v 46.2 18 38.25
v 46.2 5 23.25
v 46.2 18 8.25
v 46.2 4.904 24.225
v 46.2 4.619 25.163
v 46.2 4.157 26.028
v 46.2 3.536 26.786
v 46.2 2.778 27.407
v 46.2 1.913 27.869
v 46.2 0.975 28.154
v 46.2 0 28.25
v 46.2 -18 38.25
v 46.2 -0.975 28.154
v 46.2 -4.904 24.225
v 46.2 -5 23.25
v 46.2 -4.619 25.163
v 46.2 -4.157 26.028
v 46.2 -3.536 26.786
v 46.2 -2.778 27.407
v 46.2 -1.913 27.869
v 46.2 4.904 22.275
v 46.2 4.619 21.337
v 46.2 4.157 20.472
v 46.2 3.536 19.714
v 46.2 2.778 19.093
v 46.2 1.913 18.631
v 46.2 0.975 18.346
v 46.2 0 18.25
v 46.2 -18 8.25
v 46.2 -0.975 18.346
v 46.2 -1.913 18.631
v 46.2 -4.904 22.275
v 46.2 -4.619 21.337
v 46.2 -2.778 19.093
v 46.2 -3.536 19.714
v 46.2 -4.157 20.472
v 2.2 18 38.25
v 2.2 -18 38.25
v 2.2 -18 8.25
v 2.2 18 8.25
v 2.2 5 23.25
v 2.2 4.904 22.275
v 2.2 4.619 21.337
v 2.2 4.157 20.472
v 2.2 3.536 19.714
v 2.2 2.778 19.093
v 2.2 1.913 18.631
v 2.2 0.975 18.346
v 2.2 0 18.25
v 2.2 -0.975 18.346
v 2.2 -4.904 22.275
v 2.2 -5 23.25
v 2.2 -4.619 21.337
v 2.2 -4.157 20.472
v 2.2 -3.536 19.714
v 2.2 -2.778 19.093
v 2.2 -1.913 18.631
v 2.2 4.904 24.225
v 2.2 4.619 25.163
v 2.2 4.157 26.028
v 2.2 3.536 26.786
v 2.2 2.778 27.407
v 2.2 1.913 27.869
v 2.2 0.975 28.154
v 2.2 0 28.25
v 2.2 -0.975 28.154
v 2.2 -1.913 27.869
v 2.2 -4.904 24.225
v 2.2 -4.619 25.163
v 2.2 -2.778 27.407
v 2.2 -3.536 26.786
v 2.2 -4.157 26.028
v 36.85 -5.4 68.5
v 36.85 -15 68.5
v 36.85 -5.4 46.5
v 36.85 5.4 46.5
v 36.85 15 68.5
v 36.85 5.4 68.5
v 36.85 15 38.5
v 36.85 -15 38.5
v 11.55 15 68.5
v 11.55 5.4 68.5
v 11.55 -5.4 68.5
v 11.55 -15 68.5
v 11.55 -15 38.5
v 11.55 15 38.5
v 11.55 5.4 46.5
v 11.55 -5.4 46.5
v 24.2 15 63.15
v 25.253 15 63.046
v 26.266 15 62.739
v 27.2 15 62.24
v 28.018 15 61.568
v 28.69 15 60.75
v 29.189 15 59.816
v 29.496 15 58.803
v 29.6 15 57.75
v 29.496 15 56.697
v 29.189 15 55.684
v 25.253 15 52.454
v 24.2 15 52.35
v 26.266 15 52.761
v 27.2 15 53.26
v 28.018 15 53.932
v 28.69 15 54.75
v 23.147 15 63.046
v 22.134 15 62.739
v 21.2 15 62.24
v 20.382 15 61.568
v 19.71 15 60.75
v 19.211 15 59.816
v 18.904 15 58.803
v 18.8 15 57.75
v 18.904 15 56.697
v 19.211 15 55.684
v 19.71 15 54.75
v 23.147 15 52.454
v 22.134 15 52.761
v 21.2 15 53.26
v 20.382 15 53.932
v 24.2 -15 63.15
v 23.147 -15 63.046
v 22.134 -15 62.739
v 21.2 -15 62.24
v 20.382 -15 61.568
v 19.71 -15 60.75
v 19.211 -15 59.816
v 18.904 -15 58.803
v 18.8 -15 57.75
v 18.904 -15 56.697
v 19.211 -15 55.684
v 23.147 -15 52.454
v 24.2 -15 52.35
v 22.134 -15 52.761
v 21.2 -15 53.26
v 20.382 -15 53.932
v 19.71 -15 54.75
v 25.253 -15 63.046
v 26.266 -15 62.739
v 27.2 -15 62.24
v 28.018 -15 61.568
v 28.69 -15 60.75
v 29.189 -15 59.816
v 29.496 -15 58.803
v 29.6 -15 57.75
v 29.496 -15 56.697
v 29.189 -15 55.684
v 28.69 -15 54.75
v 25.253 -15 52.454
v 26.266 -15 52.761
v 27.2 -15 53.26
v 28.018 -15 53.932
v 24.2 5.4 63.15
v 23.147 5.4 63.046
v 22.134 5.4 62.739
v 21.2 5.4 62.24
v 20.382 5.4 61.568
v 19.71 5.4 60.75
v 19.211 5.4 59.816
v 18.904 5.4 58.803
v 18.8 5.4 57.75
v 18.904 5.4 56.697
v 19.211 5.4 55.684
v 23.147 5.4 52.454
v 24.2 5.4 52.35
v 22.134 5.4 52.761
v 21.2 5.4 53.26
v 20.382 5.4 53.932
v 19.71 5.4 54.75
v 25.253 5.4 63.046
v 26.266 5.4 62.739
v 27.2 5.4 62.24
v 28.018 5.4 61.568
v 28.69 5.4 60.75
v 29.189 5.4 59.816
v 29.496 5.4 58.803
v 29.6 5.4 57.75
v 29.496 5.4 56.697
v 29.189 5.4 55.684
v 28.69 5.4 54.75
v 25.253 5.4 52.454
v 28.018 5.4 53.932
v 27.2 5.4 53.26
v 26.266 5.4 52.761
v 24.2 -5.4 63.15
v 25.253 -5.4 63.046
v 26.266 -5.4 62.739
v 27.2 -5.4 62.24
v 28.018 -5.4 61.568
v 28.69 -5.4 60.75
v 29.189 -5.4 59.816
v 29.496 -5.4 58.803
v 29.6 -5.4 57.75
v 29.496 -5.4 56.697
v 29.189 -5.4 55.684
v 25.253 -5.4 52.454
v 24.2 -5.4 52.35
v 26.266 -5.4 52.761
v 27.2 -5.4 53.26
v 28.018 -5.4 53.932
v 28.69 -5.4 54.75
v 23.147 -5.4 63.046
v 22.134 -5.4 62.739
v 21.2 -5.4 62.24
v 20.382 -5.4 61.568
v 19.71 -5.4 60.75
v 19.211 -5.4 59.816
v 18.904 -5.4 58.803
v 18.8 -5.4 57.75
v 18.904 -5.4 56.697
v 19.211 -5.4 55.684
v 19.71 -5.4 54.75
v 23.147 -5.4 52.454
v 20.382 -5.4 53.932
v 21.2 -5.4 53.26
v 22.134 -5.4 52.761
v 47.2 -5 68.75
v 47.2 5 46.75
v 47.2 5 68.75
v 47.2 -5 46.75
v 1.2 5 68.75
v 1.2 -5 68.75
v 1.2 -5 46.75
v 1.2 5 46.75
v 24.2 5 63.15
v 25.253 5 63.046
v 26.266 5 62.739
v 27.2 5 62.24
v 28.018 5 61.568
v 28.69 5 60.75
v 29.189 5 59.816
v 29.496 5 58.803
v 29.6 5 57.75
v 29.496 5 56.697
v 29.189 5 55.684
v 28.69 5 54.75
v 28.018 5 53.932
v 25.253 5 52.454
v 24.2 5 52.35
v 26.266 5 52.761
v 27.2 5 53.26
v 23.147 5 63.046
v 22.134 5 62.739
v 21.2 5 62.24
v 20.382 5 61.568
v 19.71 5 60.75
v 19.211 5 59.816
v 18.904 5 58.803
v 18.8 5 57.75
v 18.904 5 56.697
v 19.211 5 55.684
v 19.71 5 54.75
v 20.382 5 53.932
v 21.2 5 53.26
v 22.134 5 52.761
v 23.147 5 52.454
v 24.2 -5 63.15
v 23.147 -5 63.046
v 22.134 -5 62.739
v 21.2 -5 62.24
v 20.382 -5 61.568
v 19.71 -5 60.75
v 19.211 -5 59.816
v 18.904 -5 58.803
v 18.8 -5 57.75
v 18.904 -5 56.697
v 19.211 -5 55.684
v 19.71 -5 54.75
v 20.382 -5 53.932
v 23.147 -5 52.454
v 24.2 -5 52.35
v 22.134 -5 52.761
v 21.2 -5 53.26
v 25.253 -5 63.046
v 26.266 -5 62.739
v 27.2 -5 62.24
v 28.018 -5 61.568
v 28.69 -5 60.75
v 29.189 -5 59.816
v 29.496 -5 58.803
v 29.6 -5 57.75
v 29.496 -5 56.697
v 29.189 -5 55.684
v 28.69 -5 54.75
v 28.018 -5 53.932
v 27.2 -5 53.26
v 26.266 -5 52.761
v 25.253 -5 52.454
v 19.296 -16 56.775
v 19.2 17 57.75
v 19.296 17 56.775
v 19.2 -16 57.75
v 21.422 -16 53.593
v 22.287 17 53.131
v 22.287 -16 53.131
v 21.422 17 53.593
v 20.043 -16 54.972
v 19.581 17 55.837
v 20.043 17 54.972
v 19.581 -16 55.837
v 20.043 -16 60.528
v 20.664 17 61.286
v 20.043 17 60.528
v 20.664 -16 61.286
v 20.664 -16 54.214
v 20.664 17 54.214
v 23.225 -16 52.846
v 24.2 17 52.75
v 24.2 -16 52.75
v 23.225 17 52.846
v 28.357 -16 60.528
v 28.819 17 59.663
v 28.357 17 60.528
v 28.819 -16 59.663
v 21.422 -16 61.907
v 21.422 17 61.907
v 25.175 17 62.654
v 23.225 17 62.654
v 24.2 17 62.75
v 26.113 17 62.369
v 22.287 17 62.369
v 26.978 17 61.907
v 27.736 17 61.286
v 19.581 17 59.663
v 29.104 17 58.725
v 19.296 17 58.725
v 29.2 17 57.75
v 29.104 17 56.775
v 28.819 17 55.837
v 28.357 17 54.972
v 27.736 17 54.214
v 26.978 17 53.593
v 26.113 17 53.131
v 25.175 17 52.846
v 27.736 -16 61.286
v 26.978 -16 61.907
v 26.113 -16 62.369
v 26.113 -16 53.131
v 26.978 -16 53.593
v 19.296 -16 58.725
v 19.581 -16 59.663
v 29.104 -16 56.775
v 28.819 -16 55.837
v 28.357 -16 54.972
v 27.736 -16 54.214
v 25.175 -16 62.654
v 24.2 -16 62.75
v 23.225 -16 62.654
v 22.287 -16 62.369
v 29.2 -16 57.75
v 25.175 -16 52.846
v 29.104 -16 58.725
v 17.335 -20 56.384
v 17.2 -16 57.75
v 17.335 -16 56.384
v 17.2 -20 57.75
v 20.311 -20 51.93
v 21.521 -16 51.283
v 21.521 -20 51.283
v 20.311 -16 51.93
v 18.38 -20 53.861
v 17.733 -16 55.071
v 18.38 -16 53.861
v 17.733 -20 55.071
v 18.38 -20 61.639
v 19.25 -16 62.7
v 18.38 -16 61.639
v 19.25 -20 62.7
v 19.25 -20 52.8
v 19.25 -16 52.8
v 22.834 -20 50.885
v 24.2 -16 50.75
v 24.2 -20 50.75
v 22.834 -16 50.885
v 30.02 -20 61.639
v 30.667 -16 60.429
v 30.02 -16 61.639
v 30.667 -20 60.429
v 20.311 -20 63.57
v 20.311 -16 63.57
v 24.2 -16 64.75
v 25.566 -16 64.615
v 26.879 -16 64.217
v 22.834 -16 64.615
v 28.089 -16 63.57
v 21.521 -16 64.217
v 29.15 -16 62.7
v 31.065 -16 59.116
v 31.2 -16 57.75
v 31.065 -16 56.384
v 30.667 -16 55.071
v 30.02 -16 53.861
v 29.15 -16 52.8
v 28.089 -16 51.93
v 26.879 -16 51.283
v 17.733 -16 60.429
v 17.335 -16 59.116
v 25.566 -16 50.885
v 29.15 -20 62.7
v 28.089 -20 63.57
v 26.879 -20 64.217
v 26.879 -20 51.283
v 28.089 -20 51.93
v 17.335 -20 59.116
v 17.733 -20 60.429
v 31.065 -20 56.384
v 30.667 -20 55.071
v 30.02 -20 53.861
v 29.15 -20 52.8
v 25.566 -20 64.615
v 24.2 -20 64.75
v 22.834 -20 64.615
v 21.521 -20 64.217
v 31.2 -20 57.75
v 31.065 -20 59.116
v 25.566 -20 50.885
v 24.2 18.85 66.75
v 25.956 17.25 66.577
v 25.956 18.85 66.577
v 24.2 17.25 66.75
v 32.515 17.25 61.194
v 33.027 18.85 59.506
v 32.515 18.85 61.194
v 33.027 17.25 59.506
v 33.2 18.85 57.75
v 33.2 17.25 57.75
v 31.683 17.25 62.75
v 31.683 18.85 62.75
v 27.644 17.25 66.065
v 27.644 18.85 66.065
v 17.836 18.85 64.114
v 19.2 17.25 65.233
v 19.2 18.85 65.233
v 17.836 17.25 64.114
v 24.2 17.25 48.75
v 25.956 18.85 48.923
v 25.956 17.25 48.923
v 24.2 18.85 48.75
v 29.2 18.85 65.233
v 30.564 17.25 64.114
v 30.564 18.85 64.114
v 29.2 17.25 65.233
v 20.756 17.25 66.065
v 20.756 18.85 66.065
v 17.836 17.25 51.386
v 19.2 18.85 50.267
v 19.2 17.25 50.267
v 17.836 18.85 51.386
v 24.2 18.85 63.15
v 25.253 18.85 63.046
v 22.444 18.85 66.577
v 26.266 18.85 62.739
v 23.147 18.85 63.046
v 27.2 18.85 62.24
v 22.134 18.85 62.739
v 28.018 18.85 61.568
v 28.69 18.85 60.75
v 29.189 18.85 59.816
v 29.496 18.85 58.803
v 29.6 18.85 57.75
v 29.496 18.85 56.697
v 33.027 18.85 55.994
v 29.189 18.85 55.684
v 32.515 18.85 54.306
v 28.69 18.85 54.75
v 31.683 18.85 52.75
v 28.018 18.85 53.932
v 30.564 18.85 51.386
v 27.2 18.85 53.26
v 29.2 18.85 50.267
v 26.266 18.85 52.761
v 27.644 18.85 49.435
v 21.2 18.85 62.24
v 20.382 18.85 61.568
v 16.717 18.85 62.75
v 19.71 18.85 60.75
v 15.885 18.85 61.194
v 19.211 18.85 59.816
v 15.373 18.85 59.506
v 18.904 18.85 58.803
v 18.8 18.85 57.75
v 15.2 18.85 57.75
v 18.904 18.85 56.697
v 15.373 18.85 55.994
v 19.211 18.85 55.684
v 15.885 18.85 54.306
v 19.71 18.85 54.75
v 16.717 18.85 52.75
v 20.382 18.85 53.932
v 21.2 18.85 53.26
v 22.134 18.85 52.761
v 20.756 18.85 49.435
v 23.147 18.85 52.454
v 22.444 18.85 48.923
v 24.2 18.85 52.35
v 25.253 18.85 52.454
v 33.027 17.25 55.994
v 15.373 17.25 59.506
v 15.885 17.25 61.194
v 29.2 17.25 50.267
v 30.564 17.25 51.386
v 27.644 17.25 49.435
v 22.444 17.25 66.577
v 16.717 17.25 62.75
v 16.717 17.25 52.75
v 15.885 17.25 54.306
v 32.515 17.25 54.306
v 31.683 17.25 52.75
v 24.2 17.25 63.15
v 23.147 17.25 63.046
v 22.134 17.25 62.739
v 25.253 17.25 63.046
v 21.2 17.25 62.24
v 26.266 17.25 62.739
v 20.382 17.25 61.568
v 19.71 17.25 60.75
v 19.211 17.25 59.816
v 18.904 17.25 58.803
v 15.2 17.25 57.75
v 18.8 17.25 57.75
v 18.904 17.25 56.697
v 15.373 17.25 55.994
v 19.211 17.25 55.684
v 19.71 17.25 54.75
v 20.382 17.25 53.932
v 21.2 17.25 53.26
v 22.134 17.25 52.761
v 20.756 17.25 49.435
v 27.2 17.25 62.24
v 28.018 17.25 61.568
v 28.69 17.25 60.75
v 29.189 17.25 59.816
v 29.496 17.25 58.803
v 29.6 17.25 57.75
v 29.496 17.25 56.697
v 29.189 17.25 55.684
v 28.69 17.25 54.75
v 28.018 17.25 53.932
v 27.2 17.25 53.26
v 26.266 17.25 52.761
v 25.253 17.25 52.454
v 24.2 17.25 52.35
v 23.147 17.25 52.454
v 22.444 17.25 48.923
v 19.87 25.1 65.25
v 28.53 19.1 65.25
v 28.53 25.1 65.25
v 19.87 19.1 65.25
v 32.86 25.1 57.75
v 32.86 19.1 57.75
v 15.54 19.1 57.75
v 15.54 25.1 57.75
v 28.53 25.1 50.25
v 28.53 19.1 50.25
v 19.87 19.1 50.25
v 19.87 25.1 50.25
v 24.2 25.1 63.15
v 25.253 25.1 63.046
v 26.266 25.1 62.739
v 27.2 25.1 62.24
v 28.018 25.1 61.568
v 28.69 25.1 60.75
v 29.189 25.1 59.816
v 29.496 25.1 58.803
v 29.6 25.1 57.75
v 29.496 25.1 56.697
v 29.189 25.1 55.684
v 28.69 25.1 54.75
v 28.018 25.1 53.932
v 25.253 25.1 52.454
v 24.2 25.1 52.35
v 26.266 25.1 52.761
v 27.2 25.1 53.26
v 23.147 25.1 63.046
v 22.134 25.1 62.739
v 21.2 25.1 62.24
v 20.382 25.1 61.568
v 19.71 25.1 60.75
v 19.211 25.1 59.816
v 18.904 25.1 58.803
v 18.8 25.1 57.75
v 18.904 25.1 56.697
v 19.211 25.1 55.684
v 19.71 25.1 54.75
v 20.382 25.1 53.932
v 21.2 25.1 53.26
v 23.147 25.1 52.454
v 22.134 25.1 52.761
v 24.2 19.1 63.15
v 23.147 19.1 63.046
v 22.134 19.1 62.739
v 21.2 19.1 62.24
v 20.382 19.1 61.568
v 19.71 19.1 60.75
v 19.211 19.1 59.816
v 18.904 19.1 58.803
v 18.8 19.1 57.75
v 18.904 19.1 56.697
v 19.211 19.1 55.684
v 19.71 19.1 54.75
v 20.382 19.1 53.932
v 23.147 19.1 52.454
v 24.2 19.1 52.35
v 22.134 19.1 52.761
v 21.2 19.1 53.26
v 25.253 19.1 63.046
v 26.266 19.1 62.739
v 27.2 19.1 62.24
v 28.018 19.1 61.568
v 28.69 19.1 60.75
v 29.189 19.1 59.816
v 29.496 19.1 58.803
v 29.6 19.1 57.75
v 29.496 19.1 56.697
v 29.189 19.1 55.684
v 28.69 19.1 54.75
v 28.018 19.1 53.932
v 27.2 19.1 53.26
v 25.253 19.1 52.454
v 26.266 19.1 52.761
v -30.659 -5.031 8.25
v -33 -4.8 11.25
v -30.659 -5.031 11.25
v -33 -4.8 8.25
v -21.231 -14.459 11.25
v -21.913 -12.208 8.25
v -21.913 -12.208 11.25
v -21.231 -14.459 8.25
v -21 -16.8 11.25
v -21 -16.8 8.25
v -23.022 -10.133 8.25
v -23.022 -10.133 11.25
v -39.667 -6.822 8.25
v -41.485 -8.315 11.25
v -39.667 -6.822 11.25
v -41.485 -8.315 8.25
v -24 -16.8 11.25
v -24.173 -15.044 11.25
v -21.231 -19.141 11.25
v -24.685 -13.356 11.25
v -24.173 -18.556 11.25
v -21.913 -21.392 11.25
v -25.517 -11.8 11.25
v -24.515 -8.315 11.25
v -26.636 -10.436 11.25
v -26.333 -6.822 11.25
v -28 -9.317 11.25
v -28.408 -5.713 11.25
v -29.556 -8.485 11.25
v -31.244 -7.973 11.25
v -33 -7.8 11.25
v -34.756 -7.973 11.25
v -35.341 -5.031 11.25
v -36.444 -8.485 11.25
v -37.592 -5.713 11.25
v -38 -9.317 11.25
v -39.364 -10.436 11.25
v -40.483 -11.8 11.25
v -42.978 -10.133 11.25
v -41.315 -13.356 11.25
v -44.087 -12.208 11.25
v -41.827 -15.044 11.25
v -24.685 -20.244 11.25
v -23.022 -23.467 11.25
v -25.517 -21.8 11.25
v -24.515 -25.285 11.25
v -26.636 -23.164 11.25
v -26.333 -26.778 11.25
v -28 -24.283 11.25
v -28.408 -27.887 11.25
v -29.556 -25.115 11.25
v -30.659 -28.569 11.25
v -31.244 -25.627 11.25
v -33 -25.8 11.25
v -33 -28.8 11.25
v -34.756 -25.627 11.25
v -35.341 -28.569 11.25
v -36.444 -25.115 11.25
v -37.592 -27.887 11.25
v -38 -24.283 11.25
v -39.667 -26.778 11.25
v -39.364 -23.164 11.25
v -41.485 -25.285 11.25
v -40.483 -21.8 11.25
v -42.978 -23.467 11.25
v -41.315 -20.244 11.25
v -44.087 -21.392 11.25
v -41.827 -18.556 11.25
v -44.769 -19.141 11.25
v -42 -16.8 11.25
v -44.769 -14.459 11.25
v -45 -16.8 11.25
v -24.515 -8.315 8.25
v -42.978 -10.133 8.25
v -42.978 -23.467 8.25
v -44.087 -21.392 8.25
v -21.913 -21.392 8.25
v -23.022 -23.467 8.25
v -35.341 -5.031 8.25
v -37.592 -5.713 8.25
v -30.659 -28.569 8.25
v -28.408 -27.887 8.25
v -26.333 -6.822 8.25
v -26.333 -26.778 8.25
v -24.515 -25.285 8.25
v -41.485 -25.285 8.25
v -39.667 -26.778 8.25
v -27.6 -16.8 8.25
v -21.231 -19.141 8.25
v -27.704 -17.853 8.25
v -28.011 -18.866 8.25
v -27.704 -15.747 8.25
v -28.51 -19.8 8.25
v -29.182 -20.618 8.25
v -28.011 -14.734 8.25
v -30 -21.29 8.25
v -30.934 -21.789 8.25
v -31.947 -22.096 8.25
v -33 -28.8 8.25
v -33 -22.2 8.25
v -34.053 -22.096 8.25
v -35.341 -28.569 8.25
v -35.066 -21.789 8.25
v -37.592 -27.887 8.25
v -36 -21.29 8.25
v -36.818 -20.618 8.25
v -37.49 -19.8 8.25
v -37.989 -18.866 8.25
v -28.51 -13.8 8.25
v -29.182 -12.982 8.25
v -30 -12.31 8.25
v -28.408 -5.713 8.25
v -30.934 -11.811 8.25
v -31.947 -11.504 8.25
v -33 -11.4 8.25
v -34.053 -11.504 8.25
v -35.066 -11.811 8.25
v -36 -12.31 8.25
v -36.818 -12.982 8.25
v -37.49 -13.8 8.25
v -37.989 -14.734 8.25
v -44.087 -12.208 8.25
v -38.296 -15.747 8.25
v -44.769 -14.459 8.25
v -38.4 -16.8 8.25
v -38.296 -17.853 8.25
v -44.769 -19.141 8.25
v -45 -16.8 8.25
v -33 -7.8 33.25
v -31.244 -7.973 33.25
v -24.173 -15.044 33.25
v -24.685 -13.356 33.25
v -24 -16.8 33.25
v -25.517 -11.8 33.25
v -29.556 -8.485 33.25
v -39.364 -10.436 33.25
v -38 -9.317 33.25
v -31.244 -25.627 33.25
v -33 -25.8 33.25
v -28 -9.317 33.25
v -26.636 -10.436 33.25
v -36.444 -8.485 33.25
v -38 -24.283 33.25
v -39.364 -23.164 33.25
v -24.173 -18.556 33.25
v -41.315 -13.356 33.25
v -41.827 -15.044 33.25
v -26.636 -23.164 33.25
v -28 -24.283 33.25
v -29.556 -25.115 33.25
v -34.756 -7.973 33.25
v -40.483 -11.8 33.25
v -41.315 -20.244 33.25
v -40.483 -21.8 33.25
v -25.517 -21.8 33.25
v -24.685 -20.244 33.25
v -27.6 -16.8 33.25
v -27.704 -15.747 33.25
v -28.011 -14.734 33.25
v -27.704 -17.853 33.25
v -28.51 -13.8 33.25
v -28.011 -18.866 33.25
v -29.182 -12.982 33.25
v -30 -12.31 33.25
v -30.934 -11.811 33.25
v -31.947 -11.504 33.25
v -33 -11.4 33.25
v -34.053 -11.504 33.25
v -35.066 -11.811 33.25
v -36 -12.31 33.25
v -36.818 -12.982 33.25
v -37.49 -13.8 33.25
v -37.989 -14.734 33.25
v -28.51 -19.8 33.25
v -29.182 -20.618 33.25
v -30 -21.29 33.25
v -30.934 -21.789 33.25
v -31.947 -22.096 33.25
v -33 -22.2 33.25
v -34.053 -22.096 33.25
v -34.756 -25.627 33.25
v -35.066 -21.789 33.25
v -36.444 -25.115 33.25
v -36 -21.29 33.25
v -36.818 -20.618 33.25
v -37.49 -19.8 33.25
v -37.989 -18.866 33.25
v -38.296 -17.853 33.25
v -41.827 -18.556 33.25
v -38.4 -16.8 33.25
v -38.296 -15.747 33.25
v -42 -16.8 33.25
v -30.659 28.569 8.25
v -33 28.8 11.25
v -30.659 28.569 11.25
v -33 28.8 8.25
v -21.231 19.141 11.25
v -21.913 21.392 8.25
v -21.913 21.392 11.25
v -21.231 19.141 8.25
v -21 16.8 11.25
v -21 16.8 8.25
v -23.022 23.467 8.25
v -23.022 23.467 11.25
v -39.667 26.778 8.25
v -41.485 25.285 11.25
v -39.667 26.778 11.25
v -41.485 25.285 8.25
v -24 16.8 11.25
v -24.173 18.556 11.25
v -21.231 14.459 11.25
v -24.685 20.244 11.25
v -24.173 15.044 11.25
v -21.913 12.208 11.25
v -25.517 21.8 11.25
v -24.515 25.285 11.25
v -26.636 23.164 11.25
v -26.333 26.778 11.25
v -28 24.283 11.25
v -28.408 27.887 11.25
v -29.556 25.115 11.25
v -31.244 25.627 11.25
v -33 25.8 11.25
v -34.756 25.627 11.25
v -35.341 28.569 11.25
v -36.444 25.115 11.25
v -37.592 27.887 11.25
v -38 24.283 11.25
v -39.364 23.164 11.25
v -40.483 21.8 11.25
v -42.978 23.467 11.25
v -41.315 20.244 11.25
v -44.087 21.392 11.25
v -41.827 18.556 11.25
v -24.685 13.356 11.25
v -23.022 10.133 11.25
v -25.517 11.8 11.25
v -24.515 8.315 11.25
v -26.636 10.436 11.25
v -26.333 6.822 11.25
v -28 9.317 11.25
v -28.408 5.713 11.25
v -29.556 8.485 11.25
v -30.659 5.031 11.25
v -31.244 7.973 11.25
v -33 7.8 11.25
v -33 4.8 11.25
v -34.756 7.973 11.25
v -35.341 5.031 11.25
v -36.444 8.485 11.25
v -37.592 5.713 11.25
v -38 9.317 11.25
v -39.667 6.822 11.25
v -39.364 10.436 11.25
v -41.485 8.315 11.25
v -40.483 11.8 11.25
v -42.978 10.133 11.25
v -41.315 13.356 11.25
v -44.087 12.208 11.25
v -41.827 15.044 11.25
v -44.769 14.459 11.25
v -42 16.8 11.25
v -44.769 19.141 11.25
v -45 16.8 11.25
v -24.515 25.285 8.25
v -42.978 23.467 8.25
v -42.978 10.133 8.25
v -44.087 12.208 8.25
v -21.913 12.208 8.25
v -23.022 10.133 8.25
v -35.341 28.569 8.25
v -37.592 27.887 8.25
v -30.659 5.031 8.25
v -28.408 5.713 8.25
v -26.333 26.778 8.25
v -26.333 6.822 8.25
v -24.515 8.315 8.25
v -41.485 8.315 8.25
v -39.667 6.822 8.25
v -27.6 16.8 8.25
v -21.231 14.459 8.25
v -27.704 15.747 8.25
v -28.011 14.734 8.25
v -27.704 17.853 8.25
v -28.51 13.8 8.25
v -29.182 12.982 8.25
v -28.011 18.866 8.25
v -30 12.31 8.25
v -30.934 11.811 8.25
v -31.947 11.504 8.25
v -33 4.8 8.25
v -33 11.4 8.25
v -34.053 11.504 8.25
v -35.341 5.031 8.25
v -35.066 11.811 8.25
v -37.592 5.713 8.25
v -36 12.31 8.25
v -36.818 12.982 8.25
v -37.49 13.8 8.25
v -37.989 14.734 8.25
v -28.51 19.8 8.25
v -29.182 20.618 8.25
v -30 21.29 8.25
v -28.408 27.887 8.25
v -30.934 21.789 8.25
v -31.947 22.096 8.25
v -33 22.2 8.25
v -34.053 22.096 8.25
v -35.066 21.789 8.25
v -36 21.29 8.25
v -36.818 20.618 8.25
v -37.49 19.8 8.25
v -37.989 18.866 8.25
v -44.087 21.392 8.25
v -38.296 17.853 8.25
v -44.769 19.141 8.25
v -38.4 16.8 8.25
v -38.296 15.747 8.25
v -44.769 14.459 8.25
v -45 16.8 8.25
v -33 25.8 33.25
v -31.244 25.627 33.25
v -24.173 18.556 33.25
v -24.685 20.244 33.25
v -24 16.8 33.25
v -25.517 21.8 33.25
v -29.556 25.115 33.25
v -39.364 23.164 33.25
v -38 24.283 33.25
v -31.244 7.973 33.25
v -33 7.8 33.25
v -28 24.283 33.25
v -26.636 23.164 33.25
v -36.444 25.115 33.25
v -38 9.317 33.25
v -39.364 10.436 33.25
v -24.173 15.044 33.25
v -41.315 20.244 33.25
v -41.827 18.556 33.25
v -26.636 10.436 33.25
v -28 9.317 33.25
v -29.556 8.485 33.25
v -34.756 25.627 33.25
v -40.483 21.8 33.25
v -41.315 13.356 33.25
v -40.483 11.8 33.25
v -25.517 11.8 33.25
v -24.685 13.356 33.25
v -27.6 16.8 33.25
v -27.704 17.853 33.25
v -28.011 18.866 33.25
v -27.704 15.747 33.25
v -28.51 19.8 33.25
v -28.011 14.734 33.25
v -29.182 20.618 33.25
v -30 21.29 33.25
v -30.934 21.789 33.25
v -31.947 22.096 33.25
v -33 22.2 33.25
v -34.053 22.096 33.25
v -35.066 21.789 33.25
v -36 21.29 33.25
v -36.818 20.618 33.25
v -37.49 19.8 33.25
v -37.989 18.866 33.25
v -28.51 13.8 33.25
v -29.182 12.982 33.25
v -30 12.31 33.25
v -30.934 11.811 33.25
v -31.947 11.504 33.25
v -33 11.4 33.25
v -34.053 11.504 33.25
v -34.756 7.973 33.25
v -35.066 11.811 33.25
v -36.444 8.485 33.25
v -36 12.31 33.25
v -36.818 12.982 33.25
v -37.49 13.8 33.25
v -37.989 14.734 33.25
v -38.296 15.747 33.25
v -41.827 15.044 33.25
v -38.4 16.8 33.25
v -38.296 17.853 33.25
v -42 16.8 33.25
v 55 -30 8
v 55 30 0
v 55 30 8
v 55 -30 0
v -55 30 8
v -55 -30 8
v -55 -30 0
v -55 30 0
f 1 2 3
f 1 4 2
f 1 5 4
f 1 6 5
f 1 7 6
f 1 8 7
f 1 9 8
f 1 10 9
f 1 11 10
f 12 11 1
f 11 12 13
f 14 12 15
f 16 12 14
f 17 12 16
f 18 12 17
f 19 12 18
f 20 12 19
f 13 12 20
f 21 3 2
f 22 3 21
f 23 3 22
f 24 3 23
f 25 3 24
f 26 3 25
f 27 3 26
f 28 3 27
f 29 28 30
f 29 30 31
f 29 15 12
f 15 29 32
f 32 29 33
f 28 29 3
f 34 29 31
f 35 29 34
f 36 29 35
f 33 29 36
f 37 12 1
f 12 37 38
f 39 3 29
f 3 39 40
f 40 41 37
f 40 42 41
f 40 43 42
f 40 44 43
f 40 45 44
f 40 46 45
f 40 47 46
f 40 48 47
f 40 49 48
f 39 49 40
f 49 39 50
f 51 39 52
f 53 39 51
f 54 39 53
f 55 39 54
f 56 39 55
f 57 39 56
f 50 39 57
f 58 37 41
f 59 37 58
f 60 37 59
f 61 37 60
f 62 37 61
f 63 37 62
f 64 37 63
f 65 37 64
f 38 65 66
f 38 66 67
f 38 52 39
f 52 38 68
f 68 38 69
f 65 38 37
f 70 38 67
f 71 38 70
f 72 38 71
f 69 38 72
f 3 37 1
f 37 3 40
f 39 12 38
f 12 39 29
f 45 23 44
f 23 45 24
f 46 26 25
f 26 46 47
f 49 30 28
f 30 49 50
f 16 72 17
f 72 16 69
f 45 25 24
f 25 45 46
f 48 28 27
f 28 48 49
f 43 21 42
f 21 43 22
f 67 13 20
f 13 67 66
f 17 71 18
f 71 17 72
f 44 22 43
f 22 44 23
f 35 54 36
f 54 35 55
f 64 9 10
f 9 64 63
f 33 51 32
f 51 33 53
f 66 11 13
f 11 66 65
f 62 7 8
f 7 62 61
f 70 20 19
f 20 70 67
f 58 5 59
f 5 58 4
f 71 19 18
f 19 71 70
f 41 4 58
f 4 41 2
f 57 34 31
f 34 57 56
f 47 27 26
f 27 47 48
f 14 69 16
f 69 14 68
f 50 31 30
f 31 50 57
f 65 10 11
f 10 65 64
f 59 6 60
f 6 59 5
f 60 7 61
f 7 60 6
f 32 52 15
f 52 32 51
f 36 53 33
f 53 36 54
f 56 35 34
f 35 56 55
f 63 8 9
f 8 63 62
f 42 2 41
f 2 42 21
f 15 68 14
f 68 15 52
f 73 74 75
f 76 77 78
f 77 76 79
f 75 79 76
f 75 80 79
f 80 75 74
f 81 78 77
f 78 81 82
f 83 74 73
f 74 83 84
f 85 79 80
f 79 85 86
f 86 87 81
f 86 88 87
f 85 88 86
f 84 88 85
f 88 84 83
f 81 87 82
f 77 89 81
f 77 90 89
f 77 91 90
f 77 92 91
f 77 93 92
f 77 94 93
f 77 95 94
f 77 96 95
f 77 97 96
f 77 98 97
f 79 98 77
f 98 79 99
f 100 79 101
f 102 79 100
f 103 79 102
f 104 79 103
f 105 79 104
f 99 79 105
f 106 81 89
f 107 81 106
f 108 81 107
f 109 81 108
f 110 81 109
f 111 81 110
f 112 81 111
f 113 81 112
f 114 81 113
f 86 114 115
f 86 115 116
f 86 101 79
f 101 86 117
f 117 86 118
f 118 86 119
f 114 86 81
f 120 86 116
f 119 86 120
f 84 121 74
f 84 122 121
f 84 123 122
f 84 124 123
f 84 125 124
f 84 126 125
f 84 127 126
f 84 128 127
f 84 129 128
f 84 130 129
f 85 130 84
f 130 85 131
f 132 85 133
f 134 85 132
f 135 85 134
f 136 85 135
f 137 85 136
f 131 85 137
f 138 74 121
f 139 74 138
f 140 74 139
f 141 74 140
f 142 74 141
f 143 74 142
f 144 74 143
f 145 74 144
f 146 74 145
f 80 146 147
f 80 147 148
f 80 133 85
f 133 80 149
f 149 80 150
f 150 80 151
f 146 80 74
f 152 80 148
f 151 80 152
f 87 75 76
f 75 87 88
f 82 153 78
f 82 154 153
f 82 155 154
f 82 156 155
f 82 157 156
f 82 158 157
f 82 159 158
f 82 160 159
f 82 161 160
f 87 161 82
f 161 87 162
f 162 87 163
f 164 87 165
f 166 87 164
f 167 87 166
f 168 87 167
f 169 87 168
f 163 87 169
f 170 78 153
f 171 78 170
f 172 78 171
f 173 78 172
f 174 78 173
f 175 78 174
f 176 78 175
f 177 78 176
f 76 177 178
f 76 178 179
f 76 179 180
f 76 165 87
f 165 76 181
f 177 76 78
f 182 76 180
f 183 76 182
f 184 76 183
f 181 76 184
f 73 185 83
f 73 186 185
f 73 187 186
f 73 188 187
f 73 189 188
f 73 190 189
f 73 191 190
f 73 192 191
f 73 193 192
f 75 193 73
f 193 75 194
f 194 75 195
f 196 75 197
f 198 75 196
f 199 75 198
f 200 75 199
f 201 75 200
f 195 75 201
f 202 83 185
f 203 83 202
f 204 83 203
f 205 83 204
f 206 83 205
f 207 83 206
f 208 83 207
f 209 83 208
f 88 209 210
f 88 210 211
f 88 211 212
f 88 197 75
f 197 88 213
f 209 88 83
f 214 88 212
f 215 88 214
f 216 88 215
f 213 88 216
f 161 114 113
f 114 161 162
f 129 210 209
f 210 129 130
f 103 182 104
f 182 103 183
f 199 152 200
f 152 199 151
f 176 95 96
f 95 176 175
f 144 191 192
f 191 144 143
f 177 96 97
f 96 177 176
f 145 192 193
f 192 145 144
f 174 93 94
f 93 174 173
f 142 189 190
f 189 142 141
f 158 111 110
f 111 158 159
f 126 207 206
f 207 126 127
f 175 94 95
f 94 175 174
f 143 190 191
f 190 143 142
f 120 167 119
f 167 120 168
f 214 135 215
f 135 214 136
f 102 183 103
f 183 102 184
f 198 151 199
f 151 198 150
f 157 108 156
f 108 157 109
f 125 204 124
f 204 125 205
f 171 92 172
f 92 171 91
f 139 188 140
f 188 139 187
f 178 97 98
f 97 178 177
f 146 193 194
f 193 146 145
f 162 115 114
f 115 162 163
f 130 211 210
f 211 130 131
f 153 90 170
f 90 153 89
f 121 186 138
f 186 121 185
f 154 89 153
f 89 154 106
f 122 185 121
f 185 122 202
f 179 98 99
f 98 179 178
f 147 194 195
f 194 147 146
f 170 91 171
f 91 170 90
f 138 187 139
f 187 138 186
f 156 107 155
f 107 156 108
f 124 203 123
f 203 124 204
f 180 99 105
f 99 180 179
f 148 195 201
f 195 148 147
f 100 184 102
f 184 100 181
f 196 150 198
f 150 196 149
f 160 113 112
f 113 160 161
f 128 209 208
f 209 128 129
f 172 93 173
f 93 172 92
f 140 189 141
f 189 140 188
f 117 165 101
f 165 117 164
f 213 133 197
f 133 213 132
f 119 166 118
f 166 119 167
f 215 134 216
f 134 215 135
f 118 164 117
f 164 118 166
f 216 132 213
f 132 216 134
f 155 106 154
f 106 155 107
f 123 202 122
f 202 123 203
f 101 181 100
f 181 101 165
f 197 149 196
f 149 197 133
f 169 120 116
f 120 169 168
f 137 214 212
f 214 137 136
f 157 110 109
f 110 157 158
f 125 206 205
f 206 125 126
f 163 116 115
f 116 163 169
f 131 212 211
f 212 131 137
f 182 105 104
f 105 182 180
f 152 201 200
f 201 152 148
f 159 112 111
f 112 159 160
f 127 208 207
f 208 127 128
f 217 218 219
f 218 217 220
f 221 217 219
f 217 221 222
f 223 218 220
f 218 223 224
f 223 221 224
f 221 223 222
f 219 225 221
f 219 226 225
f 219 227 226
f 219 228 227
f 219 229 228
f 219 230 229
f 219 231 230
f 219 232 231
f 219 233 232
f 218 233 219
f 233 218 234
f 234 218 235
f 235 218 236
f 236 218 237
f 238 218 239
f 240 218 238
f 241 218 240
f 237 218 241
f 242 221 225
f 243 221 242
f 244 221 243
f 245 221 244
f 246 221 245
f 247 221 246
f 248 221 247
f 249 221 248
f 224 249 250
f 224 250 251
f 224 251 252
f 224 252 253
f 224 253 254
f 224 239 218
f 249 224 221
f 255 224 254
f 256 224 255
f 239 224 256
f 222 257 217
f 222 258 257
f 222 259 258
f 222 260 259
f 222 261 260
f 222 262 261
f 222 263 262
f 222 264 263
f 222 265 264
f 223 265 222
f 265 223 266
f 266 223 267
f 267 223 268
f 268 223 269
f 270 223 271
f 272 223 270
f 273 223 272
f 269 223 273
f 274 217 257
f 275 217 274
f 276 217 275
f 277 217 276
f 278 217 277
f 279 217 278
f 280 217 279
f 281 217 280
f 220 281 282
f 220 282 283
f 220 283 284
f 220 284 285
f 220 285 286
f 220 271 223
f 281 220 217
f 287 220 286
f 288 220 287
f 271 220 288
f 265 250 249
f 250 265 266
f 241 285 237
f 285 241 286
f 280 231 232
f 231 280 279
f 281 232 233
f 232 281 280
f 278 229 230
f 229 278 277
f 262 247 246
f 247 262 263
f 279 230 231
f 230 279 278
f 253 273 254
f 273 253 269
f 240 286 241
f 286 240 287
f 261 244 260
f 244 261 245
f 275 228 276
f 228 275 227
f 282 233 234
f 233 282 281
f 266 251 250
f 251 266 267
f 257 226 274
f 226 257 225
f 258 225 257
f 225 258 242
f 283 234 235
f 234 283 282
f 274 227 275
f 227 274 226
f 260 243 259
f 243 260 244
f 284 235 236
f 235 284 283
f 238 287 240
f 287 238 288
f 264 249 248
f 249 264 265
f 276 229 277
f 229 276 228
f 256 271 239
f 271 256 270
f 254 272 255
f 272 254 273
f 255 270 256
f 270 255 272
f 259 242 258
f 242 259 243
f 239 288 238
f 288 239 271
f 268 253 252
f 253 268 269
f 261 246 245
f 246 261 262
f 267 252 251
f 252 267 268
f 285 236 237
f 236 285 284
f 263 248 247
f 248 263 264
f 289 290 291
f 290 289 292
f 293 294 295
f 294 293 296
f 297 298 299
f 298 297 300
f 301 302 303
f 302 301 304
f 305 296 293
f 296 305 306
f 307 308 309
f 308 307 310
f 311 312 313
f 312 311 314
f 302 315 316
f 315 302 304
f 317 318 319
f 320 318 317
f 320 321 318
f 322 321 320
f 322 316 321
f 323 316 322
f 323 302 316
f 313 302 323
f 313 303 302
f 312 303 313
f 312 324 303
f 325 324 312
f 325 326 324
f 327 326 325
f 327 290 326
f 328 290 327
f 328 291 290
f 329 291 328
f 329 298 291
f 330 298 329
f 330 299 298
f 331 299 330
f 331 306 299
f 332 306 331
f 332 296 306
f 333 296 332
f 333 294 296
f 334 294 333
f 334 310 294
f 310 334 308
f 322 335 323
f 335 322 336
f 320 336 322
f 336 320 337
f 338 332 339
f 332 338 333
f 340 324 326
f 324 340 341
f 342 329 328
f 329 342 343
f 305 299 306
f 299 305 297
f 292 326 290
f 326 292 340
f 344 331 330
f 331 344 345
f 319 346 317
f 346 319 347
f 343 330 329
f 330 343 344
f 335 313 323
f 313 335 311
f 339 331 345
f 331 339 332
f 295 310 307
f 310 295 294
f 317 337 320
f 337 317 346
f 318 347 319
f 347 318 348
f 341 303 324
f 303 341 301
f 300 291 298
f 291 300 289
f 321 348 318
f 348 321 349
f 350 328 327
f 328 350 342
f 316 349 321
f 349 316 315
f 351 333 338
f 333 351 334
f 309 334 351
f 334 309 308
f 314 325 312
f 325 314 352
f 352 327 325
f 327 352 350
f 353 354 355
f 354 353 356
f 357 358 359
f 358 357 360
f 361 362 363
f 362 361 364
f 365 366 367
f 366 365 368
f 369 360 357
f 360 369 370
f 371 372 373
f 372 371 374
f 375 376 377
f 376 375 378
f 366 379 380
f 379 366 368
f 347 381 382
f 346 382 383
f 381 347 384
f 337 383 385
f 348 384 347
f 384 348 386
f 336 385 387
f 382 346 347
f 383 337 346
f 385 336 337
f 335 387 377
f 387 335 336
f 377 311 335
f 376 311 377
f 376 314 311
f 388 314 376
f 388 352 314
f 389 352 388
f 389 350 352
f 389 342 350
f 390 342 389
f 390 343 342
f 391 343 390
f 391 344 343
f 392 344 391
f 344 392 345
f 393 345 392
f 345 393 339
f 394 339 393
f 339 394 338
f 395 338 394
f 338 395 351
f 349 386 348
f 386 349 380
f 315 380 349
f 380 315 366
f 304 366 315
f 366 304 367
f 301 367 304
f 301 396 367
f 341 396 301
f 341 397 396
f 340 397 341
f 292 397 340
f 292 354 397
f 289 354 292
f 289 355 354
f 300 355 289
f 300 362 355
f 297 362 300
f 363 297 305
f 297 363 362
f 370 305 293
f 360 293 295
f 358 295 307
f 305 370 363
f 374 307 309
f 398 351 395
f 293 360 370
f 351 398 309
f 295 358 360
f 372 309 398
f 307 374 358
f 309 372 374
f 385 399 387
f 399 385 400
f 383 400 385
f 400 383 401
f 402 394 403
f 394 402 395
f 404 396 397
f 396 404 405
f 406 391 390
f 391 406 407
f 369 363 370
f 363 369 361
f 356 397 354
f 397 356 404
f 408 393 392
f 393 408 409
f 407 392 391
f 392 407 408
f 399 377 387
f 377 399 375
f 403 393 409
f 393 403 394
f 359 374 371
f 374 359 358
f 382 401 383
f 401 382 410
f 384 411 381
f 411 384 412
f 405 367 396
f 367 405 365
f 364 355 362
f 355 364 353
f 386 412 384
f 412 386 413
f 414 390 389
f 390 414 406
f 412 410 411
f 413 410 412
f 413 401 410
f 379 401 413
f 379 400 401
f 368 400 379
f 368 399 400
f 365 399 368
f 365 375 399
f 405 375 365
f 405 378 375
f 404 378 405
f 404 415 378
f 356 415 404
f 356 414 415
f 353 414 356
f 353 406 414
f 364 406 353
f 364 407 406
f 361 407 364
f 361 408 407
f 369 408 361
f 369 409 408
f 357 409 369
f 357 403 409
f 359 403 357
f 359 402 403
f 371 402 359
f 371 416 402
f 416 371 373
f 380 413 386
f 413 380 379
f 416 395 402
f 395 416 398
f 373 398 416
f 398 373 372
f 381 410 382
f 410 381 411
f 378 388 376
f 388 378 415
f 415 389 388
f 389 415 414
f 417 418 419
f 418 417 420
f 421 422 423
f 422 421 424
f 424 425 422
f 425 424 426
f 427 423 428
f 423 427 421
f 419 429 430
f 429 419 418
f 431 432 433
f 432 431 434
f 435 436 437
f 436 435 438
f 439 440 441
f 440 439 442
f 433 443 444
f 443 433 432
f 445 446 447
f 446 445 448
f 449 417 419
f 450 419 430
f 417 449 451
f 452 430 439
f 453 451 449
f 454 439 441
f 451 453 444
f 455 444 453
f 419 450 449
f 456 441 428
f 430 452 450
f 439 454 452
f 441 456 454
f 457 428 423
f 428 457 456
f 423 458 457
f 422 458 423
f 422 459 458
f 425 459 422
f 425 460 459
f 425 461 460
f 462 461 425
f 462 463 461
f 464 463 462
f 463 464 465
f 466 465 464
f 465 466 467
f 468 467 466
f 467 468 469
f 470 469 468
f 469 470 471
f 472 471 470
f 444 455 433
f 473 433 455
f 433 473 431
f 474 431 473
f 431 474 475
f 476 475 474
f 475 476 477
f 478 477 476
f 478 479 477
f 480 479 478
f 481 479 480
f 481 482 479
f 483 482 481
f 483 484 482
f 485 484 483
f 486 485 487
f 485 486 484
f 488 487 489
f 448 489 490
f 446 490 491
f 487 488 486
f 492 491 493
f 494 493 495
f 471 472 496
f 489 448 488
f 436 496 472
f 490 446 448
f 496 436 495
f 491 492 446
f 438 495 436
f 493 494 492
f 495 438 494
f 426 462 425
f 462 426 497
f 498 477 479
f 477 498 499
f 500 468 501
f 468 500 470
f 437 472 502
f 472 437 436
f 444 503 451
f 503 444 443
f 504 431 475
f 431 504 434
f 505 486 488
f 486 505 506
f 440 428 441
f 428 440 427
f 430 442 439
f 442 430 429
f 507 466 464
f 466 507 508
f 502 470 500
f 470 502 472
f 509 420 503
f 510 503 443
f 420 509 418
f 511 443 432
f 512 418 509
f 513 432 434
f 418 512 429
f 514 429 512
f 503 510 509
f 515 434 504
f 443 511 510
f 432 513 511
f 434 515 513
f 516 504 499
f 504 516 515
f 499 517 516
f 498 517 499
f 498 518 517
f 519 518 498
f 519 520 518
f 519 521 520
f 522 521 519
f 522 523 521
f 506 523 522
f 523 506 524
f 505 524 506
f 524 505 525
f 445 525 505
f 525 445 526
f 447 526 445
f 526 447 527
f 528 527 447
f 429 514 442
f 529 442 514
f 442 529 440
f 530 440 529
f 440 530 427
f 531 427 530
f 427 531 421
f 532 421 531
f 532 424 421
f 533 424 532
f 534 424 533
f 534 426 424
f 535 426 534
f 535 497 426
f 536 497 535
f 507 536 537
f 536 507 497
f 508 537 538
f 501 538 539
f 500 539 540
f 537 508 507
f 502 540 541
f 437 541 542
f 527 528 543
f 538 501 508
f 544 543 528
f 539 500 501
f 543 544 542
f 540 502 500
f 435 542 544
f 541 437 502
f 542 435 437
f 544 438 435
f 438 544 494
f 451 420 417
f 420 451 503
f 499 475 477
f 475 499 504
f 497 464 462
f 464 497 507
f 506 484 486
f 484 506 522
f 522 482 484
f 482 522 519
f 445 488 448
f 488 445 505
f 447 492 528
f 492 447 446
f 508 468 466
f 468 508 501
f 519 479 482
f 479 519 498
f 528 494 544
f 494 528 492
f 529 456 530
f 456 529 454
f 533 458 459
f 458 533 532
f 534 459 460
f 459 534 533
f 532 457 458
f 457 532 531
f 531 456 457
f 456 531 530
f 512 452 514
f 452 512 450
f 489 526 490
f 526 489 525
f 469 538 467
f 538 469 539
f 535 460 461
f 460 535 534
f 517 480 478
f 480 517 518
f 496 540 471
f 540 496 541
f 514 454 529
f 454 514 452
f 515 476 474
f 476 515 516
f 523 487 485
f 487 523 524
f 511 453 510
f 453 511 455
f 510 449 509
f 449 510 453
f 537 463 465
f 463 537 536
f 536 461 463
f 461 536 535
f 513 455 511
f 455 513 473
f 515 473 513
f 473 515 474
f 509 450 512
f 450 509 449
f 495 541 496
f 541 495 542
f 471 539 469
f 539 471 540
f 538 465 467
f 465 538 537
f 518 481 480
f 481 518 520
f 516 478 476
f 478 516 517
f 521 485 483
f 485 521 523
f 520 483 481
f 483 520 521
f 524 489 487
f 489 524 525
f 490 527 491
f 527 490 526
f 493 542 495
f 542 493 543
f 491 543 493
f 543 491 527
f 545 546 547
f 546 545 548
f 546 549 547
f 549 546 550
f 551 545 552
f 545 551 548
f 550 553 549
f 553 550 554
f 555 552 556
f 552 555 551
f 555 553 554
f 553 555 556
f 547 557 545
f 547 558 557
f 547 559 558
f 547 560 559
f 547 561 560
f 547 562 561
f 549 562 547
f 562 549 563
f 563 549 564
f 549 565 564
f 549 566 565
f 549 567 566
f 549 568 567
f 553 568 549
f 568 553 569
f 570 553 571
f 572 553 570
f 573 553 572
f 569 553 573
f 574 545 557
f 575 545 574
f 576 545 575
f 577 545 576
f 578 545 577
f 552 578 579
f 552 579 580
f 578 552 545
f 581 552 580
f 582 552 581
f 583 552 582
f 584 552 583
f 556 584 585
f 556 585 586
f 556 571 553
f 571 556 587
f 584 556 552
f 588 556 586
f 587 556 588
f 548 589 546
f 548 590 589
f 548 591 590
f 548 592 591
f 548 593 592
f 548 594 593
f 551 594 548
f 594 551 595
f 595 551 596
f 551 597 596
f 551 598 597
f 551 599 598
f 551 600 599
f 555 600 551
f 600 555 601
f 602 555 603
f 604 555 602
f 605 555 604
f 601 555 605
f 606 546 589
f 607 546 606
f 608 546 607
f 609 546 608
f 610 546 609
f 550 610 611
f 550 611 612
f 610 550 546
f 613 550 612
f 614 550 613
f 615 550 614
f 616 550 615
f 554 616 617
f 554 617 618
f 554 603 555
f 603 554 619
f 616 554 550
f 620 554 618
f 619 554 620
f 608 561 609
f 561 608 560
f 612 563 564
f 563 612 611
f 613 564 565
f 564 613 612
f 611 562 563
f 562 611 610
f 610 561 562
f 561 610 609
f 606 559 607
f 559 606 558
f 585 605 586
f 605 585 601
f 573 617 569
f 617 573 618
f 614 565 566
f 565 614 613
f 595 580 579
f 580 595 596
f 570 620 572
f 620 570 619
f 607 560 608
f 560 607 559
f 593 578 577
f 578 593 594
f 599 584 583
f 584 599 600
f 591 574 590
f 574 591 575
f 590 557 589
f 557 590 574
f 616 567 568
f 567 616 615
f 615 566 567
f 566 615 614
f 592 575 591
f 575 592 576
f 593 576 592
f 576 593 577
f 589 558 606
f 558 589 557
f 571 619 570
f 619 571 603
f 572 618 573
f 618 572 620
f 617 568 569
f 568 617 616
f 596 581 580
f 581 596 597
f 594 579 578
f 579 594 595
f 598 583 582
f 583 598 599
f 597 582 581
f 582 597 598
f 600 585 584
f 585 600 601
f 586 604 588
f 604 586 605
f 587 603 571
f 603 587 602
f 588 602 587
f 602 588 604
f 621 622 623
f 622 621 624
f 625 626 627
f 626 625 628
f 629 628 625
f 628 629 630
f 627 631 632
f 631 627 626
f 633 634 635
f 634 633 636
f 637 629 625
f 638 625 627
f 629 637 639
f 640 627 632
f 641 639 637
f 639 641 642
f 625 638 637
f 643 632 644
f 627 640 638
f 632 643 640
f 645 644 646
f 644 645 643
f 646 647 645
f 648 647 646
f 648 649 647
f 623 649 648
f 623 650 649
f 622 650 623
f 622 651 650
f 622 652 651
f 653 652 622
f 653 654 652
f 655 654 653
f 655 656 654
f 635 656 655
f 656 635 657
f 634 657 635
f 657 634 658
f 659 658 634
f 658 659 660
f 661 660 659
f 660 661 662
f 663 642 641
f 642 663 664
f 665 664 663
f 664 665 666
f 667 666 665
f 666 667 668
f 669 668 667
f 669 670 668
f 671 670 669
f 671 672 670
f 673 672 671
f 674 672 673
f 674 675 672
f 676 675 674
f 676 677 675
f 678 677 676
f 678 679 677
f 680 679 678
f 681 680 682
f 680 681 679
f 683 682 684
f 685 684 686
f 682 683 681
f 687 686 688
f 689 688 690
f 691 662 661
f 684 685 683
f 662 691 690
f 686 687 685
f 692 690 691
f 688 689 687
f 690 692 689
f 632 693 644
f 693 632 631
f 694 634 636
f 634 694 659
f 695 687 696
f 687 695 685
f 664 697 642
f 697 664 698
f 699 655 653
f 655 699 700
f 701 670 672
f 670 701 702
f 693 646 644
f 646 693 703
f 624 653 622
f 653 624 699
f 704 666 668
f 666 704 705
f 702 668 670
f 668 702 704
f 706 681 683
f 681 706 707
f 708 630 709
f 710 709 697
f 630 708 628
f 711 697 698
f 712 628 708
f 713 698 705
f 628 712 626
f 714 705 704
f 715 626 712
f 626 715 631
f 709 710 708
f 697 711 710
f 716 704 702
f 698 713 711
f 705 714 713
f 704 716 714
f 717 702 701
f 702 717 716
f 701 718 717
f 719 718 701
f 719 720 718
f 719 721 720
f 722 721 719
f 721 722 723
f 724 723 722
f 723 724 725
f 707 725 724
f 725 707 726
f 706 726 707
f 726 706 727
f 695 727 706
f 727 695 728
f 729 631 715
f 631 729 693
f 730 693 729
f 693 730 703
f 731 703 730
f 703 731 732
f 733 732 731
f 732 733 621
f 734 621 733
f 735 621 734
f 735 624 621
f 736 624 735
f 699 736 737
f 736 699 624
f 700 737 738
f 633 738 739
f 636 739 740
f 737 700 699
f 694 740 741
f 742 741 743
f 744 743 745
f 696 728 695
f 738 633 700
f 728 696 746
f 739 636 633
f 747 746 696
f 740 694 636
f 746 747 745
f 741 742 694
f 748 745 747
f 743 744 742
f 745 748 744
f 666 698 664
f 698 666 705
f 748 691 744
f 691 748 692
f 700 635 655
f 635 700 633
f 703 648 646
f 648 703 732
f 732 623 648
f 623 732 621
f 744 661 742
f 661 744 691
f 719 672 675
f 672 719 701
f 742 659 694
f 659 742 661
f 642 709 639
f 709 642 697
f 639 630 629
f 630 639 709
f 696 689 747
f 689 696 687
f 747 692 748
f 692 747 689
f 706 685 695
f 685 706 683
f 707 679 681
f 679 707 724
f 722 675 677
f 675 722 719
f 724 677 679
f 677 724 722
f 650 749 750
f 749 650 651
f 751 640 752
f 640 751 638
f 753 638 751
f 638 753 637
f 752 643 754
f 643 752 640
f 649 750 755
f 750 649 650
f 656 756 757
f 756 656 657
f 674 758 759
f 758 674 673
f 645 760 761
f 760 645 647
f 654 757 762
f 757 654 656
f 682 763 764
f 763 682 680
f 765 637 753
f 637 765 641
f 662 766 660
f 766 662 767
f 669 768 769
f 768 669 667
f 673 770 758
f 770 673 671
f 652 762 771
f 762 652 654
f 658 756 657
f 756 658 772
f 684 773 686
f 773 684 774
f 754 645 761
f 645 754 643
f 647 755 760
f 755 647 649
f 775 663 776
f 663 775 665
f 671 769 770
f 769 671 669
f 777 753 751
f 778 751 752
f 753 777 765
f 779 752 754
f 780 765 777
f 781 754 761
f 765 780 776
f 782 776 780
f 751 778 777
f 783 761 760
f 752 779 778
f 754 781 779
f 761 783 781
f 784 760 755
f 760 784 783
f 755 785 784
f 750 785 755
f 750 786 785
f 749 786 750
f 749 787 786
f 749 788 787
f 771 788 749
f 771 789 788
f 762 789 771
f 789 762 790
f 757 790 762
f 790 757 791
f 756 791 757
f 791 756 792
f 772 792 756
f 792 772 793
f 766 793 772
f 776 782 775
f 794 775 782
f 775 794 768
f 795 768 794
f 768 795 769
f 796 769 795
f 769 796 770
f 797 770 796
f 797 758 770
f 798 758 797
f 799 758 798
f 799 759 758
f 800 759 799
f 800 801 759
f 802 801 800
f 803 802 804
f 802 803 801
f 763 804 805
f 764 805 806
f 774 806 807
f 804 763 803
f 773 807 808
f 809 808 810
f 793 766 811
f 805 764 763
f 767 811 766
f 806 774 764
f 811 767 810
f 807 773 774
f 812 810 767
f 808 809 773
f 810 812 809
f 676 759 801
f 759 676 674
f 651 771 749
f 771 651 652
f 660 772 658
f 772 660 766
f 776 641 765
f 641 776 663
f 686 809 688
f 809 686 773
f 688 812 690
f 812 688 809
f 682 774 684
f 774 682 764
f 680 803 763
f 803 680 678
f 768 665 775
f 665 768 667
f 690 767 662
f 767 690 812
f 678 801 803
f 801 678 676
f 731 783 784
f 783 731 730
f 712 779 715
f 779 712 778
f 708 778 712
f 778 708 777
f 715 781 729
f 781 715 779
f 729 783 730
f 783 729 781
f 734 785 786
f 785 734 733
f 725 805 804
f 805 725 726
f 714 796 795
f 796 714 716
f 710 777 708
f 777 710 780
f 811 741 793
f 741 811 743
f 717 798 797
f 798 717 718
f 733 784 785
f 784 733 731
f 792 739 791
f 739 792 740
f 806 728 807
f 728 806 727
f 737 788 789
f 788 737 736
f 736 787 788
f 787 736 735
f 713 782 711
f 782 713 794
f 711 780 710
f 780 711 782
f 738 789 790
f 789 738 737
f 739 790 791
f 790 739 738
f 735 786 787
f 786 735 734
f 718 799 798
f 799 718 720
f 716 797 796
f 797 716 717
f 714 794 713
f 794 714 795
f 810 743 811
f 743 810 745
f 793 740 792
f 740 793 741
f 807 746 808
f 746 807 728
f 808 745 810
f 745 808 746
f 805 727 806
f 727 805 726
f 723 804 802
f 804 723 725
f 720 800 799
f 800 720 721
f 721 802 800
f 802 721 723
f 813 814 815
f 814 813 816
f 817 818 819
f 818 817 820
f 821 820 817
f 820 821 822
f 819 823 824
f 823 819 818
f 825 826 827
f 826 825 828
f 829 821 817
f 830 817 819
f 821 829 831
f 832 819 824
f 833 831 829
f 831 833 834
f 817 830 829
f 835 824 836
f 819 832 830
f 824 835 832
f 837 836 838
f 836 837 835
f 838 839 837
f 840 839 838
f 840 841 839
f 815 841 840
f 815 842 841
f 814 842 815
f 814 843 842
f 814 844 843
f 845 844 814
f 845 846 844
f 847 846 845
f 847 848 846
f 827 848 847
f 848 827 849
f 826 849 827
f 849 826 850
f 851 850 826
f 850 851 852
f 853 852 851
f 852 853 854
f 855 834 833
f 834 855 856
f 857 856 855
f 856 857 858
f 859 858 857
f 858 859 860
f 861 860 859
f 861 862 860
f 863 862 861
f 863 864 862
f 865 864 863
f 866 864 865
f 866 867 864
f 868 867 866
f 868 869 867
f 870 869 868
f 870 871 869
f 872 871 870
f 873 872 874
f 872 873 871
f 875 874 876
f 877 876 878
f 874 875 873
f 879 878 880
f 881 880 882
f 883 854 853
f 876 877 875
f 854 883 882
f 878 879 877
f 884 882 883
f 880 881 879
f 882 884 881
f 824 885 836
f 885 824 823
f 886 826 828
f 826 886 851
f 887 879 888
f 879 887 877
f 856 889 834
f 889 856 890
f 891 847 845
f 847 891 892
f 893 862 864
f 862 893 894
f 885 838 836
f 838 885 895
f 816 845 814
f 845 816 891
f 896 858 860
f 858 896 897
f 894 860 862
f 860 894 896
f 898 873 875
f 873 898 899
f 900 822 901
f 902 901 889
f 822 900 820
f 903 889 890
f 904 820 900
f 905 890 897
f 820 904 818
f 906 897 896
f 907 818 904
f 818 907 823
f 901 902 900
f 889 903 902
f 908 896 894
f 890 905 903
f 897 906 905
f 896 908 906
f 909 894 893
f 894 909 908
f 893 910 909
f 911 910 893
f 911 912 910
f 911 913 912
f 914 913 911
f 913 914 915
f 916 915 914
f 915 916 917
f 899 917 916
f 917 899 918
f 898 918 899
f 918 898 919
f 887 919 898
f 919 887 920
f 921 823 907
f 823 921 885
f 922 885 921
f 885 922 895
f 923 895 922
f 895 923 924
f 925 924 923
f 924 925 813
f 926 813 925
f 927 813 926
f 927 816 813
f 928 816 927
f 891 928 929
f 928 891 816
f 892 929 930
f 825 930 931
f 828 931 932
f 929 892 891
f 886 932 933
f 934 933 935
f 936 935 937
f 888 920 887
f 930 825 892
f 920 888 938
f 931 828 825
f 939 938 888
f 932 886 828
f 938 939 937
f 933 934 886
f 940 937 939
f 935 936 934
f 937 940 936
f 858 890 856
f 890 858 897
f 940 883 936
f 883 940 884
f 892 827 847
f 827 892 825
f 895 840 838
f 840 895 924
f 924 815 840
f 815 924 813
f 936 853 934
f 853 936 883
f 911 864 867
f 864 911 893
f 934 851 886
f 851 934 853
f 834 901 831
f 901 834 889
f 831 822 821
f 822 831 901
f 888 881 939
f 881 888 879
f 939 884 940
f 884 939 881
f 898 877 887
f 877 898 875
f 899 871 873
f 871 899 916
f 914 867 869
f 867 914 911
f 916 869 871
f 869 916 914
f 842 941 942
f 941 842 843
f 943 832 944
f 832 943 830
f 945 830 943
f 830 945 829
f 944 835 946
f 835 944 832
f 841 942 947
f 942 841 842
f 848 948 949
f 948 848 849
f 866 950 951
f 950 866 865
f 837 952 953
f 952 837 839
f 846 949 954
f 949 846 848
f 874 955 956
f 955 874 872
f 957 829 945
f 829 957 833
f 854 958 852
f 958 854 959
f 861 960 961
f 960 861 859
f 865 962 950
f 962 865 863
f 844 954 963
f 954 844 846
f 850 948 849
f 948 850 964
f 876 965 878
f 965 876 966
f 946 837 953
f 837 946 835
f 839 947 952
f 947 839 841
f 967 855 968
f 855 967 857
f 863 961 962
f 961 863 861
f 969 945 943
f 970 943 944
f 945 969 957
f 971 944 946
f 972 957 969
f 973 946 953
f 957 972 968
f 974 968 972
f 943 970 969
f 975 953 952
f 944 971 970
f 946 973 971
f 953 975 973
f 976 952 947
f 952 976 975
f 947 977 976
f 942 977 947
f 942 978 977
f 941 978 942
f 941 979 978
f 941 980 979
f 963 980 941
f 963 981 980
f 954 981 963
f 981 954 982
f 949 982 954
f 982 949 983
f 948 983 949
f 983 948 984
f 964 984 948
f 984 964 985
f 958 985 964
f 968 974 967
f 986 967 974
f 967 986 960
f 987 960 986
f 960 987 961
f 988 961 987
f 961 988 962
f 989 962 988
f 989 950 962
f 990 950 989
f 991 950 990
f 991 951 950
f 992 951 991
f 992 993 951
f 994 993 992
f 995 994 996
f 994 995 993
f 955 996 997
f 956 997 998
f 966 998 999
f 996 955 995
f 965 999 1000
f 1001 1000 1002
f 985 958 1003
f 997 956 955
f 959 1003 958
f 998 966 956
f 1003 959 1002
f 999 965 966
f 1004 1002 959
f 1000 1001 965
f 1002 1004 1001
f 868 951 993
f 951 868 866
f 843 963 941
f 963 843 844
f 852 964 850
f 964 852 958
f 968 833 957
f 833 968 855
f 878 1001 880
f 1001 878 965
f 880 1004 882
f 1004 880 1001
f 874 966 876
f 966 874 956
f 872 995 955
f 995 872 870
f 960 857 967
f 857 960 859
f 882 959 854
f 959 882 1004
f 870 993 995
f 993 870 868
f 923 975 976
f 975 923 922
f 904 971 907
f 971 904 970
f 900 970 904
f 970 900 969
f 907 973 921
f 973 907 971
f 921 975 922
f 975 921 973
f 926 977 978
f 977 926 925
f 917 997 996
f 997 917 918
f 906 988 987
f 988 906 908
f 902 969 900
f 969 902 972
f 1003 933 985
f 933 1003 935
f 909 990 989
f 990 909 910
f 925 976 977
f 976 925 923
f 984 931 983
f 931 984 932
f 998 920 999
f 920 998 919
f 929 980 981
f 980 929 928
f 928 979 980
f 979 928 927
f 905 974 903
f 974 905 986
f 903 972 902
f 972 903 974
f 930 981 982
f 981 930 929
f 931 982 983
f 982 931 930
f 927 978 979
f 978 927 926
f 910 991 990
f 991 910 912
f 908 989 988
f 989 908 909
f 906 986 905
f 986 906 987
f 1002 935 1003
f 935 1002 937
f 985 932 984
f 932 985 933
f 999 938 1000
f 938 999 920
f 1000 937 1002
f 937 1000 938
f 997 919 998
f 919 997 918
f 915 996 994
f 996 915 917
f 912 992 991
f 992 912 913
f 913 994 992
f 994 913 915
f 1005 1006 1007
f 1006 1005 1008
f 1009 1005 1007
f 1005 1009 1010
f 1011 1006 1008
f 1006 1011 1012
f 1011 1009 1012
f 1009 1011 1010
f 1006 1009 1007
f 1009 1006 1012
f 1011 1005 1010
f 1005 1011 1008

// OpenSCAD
$fn = 32;

// ------------------------------------------------------------------------
// Indexing jig: plate 110 x 60 mm, pin d10
// Every part is its own module, assembly() places every instance.
// ------------------------------------------------------------------------

// --- part 1 ---
module jig_plate() {
  difference() {
    translate([-55, -30, 0]) cube([110, 60, 8]);
  }
}

// --- part 2 ---
module locator_block() {
  difference() {
    translate([-22, -18, 0]) cube([44, 36, 30]);
    translate([0, 0, 15]) rotate([0, 90, 0]) cylinder(h = 46, d = 10, center = true);
  }
}

// --- part 3 ---
module index_fork() {
  difference() {
    translate([-12.65, -15, 0]) cube([25.3, 30, 30]);
    translate([-13.65, -5.4, 8]) cube([27.3, 10.8, 23]);
    translate([0, 0, 19.25]) rotate([90, 0, 0]) cylinder(h = 32, d = 10.8, center = true);
  }
}

// --- part 4 ---
module index_arm() {
  difference() {
    translate([-23, -5, 0]) cube([46, 10, 22]);
    translate([0, 0, 11]) rotate([90, 0, 0]) cylinder(h = 12, d = 10.8, center = true);
  }
}

// --- part 5 ---
module index_pin() {
  rotate([0, 90, 0]) cylinder(h = 34, d = 10, center = true);
  translate([-20, 0, 0]) rotate([0, 90, 0]) cylinder(h = 4, d = 14);
}

// --- part 6 ---
module pin_washer() {
  difference() {
      translate([0, 0, 0]) cylinder(h = 1.6, d = 18);
      translate([0, 0, -1]) cylinder(h = 3.6, d = 10.8);
    }
}

// --- part 7 ---
module lock_nut() {
  difference() {
    linear_extrude(height = 6) polygon(points = [[8.66, 0], [4.33, 7.5], [-4.33, 7.5], [-8.66, 0], [-4.33, -7.5], [4.33, -7.5]]);
    translate([0, 0, -1]) cylinder(h = 8, d = 10.8);
  }
}

// --- part 8 ---
module guide_bush_a() {
  difference() {
    union() {
      cylinder(h = 3, d = 24);
      translate([0, 0, 3]) cylinder(h = 22, d = 18);
    }
    translate([0, 0, -1]) cylinder(h = 27, d = 10.8);
  }
}

// --- part 9 ---
module guide_bush_b() {
  difference() {
    union() {
      cylinder(h = 3, d = 24);
      translate([0, 0, 3]) cylinder(h = 22, d = 18);
    }
    translate([0, 0, -1]) cylinder(h = 27, d = 10.8);
  }
}

// --- assembly ---
module assembly() {
  color([0.80, 0.24, 0.20]) translate([0, 0, 0]) rotate([0, 0, 0]) jig_plate();
  color([0.20, 0.45, 0.75]) translate([24.2, 0, 8.25]) rotate([0, 0, 0]) locator_block();
  color([0.25, 0.62, 0.32]) translate([24.2, 0, 38.5]) rotate([0, 0, 0]) index_fork();
  color([0.92, 0.70, 0.18]) translate([24.2, 0, 46.75]) rotate([0, 0, 0]) index_arm();
  color([0.58, 0.35, 0.70]) translate([24.2, 0, 57.75]) rotate([0, 0, 90]) index_pin();
  color([0.16, 0.66, 0.66]) translate([24.2, 18.85, 57.75]) rotate([90, 0, 0]) pin_washer();
  color([0.85, 0.48, 0.18]) translate([24.2, 25.1, 57.75]) rotate([90, 0, 0]) lock_nut();
  color([0.55, 0.60, 0.65]) translate([-33, -16.8, 8.25]) rotate([0, 0, 0]) guide_bush_a();
  color([0.75, 0.30, 0.55]) translate([-33, 16.8, 8.25]) rotate([0, 0, 0]) guide_bush_b();
}

assembly();
